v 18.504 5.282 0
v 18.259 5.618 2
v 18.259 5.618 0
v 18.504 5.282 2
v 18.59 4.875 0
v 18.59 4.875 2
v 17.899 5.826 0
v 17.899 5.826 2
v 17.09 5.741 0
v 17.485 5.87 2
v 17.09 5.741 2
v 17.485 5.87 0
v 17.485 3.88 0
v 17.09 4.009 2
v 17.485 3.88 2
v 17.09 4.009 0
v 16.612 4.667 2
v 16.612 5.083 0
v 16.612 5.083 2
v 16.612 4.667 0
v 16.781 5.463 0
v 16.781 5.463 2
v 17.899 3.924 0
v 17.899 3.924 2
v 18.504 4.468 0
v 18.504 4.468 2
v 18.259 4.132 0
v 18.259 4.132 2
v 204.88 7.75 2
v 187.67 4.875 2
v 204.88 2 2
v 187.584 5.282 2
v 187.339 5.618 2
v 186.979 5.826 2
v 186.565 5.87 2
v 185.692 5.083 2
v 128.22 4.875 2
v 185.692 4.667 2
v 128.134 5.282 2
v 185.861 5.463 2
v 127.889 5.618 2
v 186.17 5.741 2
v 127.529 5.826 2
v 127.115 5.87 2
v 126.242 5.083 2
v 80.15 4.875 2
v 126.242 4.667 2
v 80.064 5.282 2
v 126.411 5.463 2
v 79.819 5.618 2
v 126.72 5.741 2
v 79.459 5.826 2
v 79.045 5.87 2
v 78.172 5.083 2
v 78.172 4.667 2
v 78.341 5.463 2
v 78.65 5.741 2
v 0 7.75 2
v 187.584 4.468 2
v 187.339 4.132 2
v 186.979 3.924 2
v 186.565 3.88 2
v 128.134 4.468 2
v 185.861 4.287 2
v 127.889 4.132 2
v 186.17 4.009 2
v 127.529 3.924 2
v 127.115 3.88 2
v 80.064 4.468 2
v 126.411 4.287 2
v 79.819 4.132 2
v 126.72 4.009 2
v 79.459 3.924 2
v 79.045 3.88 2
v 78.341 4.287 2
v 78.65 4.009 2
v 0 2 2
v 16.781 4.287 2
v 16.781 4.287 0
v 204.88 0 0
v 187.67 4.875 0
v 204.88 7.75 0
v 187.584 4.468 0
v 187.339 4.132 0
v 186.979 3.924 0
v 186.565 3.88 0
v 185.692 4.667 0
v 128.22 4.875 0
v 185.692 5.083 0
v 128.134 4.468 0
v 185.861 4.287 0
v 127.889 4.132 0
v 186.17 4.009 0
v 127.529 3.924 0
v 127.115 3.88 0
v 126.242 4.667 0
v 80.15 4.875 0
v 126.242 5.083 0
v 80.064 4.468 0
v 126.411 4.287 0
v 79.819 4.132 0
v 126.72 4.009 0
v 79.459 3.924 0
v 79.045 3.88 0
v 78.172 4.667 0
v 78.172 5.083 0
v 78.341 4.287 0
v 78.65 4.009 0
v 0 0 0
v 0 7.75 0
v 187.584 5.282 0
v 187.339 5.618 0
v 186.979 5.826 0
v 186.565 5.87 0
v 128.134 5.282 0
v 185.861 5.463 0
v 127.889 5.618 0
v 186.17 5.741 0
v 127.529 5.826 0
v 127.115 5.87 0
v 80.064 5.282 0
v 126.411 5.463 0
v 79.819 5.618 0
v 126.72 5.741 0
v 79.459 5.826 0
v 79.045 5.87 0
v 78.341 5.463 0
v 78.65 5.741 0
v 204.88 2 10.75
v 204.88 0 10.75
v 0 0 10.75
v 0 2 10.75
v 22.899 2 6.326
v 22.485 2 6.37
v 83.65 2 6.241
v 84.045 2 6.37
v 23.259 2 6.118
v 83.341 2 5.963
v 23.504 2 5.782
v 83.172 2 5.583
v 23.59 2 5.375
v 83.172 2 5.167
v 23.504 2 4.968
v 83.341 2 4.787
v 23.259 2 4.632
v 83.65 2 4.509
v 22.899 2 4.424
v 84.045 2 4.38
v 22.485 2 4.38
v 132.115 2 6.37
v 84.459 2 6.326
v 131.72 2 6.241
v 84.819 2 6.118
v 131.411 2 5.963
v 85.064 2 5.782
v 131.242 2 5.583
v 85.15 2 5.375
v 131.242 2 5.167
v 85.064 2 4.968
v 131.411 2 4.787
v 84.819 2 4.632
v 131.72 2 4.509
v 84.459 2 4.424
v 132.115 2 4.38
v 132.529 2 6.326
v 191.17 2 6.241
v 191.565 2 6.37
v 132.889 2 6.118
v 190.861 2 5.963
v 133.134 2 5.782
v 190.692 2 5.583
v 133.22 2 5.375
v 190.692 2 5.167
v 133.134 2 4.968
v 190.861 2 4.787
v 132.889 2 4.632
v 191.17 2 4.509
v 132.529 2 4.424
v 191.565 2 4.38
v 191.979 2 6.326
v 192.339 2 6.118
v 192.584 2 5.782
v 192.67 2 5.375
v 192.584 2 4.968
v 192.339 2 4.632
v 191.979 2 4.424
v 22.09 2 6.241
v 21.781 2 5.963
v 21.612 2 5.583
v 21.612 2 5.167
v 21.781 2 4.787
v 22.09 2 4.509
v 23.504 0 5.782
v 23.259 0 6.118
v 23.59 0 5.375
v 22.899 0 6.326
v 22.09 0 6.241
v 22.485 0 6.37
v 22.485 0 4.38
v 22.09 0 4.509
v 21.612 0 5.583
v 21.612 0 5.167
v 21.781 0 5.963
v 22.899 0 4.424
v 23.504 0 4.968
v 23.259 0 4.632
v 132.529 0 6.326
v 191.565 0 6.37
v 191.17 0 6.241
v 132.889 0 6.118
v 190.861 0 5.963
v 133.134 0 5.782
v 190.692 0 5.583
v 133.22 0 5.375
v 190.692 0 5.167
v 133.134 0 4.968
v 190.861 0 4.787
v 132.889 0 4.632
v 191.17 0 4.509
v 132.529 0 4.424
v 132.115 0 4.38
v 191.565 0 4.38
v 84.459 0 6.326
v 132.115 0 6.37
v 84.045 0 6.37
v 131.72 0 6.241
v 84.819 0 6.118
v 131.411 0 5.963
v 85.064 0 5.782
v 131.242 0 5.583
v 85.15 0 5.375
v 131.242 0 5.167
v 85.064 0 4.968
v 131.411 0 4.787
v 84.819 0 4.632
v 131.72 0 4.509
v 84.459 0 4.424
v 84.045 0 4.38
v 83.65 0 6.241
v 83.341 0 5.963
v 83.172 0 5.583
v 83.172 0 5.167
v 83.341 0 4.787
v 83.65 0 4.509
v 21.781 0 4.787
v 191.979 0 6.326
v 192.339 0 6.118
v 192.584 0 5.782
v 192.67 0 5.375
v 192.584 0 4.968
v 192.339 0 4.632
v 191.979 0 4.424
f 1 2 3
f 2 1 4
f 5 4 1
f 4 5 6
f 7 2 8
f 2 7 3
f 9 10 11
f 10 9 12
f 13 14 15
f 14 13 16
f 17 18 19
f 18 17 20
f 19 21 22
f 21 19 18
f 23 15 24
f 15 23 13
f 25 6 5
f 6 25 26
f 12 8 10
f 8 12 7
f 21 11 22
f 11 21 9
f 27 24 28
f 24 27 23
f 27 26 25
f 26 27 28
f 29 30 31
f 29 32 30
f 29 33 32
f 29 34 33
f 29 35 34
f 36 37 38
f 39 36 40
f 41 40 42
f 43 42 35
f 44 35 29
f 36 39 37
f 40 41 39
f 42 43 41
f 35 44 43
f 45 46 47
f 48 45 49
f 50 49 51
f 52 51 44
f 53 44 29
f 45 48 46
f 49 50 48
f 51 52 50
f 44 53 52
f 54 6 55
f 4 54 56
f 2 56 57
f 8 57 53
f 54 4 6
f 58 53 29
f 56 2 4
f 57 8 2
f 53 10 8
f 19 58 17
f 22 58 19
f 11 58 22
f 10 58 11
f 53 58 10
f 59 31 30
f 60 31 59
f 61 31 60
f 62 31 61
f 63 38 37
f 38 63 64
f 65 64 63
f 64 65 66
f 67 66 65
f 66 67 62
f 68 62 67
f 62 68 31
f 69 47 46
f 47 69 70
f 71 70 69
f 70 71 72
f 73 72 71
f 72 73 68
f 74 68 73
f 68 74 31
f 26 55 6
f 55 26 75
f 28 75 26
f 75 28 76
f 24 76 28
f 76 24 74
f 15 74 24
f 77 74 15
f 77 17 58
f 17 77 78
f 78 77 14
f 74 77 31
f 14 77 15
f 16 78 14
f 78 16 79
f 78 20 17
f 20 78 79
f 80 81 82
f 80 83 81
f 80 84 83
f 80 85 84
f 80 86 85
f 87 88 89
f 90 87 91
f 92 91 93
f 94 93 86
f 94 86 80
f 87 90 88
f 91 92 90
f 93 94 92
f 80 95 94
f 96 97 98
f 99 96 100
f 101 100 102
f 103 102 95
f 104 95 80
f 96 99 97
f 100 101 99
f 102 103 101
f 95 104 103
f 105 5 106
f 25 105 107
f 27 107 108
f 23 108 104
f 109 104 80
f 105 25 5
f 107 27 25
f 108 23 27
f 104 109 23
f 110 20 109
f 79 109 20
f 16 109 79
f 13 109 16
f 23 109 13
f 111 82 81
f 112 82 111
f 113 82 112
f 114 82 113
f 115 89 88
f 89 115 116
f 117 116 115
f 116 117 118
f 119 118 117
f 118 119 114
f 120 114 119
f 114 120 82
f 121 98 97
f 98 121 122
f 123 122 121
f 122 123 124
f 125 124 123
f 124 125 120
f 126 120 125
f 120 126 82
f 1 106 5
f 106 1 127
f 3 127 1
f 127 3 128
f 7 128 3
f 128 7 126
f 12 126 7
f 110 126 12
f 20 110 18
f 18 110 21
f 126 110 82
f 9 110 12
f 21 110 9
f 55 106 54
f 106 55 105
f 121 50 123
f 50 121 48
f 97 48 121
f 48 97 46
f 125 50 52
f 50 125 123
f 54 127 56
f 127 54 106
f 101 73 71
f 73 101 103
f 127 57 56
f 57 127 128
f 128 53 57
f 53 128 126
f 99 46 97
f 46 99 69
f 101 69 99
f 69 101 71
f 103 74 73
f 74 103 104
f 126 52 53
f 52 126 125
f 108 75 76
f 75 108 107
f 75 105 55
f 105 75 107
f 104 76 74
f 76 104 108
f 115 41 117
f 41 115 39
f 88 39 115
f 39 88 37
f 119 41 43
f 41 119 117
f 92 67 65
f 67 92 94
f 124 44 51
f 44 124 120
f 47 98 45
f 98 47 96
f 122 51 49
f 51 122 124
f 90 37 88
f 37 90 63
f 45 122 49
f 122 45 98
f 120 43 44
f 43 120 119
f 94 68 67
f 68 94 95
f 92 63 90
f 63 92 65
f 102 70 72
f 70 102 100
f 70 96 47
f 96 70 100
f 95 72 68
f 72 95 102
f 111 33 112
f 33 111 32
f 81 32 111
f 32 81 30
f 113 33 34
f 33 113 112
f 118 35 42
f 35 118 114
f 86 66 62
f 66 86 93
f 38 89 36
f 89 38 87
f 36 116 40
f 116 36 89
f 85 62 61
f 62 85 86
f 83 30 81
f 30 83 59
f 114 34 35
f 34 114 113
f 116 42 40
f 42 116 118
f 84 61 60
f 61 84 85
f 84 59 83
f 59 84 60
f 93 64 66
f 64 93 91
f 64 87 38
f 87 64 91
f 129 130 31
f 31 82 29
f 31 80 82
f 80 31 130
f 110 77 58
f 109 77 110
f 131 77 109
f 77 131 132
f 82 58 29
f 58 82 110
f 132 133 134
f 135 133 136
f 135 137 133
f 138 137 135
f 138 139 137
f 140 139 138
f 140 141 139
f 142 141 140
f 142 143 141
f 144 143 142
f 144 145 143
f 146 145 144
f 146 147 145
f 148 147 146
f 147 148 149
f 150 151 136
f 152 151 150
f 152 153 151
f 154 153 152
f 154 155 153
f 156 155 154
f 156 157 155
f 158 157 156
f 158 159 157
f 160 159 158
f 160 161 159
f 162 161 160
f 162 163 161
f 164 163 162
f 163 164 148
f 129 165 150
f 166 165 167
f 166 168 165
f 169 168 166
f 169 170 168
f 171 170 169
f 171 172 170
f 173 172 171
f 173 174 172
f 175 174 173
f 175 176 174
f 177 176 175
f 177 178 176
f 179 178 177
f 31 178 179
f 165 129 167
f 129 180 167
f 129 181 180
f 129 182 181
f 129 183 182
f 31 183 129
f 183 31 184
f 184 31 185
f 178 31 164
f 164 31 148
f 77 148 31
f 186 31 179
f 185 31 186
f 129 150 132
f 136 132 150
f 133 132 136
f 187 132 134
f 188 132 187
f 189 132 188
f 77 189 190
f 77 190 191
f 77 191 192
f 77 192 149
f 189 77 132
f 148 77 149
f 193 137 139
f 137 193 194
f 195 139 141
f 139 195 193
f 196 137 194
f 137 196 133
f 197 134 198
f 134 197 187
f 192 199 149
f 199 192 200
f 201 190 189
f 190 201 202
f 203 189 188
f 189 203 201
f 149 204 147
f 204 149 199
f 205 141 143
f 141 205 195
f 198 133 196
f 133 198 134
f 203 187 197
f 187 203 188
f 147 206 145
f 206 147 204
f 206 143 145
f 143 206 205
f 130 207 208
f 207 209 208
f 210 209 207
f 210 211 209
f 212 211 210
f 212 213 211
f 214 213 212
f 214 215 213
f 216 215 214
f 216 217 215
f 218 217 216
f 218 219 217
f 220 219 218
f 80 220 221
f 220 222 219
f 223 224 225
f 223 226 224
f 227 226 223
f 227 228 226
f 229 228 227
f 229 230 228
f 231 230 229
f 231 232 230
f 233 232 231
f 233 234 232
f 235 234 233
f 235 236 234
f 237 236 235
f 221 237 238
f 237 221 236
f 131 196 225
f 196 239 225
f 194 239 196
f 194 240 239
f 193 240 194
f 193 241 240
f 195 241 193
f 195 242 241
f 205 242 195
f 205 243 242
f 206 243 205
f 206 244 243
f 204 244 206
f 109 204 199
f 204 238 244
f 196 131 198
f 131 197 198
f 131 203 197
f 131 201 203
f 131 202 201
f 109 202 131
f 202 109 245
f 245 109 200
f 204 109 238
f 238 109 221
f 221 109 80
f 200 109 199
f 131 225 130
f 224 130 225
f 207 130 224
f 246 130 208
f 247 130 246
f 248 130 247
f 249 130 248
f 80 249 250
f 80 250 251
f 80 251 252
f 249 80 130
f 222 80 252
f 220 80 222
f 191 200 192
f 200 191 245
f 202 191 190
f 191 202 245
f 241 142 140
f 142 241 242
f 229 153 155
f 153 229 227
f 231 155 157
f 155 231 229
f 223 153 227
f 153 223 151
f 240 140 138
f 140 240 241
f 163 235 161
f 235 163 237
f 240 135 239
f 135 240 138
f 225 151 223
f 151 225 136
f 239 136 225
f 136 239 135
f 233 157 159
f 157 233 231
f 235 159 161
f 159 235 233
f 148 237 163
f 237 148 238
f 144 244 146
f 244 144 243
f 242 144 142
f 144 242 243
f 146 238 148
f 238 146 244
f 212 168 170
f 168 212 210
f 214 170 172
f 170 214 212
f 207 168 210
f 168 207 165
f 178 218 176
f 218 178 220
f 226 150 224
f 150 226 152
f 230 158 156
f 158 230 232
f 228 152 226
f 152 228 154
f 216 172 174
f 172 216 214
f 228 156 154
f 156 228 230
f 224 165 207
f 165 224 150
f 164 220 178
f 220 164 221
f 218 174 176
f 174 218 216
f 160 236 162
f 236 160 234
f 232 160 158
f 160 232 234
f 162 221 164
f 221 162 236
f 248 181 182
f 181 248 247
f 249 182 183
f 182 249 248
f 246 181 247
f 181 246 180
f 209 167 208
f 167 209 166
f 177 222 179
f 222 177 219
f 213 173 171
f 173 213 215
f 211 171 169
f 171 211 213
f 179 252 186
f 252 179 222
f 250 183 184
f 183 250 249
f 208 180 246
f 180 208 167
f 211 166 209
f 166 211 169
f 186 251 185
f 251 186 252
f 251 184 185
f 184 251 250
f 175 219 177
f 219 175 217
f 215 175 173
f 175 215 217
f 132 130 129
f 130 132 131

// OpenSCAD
module screw_hole(x, y, z, radius, height, angle){
    rotate([angle,0,0])translate([x, y, z])cylinder(r=radius, h=height, $fn=15);
}

//Breathing room for the right angle
_offset = 5;
//Order: length, height, width
dimensions = [204.88, 5.75, 2];
secondary = [dimensions[0], dimensions[2], dimensions[1] + _offset];

screw_locations = [17.59, 79.15, 127.22, 186.67];
screw_radius = 2/2;

difference(){
translate([0, dimensions[2], 0])cube(dimensions);
    for(a=screw_locations){
        screw_hole(a, (dimensions[1] + dimensions[2]*2) / 2, 0, screw_radius, dimensions[2]);
    }
}
rotate(a=[90, 0, 0])translate([0, -2, -2])difference(){
translate([0, dimensions[2], 0])cube([dimensions[0], dimensions[1] + _offset, dimensions[2]]);
    for(a=screw_locations){
        screw_hole(a + _offset, (dimensions[1] + _offset + dimensions[2]*2) / 2, 0, screw_radius, dimensions[2]);
    }
}
